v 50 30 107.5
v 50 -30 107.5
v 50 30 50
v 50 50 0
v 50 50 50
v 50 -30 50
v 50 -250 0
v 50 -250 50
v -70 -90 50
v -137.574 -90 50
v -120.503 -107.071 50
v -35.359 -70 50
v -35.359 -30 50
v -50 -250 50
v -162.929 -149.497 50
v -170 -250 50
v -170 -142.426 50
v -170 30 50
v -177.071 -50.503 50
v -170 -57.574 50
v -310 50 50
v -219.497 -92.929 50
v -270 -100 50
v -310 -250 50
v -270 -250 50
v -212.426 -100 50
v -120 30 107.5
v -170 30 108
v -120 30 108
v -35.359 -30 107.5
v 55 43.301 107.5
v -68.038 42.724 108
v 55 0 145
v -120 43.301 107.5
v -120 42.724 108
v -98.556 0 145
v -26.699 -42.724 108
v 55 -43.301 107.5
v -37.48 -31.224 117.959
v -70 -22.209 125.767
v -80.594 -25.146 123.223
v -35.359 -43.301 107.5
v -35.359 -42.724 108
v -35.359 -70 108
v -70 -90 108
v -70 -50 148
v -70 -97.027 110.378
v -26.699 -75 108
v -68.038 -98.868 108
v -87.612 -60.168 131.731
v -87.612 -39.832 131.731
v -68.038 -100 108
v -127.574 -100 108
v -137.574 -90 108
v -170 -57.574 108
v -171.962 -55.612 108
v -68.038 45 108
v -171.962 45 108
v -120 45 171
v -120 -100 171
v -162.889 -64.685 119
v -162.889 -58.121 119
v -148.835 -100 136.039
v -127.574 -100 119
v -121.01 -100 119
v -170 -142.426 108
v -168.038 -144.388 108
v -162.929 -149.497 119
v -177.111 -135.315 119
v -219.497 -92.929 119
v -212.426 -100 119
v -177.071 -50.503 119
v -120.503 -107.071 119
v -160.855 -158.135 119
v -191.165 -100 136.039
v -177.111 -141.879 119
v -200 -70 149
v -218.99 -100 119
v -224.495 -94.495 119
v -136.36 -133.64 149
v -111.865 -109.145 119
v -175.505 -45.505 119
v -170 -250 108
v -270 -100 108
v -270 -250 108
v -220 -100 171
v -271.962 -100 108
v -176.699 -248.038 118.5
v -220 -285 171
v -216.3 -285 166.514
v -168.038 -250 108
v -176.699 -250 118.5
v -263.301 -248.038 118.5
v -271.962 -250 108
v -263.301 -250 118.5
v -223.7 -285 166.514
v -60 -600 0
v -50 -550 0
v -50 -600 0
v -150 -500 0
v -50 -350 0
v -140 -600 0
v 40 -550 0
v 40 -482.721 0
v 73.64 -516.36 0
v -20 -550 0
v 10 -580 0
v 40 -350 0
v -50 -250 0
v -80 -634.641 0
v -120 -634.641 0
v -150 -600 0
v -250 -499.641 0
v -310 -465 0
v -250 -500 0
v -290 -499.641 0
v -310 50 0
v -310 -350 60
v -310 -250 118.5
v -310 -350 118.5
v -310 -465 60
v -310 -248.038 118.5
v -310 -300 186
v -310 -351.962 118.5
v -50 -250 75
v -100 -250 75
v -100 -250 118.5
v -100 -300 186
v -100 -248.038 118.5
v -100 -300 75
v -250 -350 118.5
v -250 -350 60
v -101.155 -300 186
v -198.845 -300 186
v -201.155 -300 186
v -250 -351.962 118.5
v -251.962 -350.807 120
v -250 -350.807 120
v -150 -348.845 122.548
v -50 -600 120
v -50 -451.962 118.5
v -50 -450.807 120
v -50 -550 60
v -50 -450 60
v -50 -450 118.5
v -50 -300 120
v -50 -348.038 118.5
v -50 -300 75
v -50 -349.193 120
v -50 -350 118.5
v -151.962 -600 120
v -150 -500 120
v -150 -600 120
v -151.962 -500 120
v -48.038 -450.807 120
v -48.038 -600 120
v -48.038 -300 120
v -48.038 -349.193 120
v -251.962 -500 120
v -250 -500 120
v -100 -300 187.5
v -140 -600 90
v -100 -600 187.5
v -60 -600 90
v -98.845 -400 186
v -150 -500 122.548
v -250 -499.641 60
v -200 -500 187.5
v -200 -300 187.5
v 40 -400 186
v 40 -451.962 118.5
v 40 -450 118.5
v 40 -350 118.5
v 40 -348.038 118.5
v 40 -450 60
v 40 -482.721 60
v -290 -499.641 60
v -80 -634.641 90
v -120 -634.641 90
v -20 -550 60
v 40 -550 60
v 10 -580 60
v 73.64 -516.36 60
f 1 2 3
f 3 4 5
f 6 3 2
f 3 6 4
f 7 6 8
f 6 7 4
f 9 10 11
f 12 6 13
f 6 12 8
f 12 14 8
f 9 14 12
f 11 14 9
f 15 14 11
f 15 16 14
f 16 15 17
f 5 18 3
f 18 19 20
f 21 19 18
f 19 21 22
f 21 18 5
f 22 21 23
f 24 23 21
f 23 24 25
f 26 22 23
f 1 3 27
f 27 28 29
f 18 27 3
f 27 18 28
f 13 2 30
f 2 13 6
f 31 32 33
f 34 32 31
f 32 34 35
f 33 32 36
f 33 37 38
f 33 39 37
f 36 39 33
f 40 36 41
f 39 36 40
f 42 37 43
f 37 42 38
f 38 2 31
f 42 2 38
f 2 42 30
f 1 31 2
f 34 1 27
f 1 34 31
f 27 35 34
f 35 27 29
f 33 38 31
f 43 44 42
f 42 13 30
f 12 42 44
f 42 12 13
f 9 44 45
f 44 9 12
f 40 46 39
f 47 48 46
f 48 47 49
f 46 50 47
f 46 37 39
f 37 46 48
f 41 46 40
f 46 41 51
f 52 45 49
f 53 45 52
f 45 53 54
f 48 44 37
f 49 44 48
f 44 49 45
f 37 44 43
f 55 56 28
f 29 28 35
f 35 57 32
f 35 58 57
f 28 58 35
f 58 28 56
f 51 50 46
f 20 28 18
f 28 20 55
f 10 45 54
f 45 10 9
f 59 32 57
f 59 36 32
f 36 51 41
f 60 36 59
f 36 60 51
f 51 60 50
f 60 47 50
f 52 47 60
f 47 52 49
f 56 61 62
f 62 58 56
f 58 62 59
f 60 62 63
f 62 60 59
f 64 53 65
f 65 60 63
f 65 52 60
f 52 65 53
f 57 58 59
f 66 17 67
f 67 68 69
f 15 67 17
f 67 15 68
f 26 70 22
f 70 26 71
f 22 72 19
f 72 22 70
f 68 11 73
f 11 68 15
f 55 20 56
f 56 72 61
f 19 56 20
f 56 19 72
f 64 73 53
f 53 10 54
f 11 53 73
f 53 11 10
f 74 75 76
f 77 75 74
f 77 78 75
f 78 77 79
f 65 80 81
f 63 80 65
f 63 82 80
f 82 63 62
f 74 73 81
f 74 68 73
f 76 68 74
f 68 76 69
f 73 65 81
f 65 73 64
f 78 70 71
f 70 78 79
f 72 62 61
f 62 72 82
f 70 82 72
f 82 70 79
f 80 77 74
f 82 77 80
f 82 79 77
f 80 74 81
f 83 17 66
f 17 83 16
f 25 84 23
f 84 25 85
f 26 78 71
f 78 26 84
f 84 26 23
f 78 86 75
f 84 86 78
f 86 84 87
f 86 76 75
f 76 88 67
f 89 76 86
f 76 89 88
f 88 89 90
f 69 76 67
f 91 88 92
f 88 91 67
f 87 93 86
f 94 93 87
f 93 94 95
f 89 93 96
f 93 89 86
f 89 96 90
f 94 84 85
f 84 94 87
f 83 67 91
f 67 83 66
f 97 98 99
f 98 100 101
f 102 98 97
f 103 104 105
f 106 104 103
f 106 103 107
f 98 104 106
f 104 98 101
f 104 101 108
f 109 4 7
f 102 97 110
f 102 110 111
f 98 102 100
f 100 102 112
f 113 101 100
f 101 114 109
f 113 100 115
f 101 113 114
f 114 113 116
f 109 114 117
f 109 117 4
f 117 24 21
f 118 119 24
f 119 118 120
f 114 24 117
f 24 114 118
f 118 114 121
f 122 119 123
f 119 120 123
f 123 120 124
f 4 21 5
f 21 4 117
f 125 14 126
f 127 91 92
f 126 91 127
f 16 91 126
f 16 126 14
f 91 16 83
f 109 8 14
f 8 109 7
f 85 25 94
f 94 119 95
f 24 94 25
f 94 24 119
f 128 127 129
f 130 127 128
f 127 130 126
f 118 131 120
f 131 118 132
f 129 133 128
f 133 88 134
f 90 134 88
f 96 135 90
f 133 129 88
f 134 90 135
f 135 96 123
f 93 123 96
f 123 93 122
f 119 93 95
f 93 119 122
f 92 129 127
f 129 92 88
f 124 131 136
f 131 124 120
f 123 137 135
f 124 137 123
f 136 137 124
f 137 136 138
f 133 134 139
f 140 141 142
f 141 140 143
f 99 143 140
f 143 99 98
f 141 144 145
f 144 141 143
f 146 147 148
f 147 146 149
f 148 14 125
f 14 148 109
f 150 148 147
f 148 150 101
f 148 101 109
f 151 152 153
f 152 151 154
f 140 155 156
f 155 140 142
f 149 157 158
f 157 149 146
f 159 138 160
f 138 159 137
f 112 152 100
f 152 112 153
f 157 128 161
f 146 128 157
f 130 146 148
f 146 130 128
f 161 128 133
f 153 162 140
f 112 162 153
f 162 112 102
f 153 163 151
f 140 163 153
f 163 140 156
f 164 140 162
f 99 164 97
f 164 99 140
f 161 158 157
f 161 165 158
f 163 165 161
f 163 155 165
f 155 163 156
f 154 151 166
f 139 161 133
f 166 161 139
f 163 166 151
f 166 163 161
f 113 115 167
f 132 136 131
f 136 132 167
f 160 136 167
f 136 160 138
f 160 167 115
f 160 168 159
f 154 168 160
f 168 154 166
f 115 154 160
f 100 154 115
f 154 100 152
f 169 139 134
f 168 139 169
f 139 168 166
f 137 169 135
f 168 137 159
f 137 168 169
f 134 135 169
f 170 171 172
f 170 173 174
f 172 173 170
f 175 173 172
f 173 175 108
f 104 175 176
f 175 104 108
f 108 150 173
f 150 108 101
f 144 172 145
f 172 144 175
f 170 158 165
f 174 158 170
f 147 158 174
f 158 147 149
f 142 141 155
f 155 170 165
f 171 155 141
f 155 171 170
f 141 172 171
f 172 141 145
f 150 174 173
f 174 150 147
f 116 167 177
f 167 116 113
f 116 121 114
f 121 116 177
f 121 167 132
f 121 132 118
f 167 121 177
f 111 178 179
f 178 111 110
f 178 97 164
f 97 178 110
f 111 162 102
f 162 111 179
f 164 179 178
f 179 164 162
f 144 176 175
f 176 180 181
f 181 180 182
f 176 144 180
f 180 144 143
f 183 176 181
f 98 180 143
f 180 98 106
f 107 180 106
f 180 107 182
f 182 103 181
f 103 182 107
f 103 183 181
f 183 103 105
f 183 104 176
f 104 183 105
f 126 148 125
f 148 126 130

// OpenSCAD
translate([0,0,80]){
union(){

translate([-10,0,0]) cube([120,60,60],center=true);
scale([1,1,0.5]) translate([55,0,80]) rotate([0,270,0])cylinder(175,50,50, $fn=3);

translate([-70,-50,0]) rotate([0,0,30]) cylinder(60, 40,40, $fn=6, center=true);
translate([-70,-50,48]) rotate([0,0,30]) cylinder(40, 50,0, $fn=6, center=true);

translate([-120,-30,0]) cube([100,120,60],center=true);
scale([1,1,0.7]) translate([-120,45,70]) rotate([0,270,90])cylinder(145,60,60, $fn=3);

translate([-170,-100,0]) rotate([0,0,45]) cube([60,80,80],center=true);
scale([1,1,0.5]) translate([-200,-70,98]) rotate([0,270,135])cylinder(90,40,40, $fn=3);


translate([-220,-200,0]) cube([100,200,60],center=true);
scale([1,1,0.7]) translate([-220,-100,70]) rotate([0,270,90])cylinder(185,60,60, $fn=3);

translate([-310,-250,-80]) color([0,0,0])cube([360,300,50]);

}//union
}//translate

scale([1,1,1.5])translate([0,0,30]){
union(){
translate([-205,-300,10]) cube([210,100,80],center=true);
scale([1,1,0.5]) translate([-100,-300,128]) rotate([0,270,0])cylinder(210,60,60, $fn=3);

translate([-100,-450,10]) cube([100,300,80],center=true);
scale([1,1,0.5]) translate([-100,-300,130]) rotate([0,270,90])cylinder(300,60,60, $fn=3);

translate([-200,-400,10]) cube([100,200,80],center=true);
scale([1,1,0.5]) translate([-200,-300,130]) rotate([0,270,90])cylinder(200,60,60, $fn=3);

translate([-10,-400,10]) cube([100,100,80],center=true);
scale([1,1,0.5]) translate([40,-400,128]) rotate([0,270,0])cylinder(140,60,60, $fn=3);

translate([-270,-465,-10])cylinder(40, 40,40, $fn=6, center=true);

translate([-280,-395,-10]) cube([60,140,40],center=true);

translate([-100,-600,0]) cylinder(60, 40,40, $fn=6, center=true);

translate([-50,-550,-30]) cube([90,100,40]);

translate([10,-580,-30]) rotate([0,0,45])cube([90,48,40]);

translate([-100,-300,-30]) cube([50,50,50]);
}//union
}//scale

//крыши
